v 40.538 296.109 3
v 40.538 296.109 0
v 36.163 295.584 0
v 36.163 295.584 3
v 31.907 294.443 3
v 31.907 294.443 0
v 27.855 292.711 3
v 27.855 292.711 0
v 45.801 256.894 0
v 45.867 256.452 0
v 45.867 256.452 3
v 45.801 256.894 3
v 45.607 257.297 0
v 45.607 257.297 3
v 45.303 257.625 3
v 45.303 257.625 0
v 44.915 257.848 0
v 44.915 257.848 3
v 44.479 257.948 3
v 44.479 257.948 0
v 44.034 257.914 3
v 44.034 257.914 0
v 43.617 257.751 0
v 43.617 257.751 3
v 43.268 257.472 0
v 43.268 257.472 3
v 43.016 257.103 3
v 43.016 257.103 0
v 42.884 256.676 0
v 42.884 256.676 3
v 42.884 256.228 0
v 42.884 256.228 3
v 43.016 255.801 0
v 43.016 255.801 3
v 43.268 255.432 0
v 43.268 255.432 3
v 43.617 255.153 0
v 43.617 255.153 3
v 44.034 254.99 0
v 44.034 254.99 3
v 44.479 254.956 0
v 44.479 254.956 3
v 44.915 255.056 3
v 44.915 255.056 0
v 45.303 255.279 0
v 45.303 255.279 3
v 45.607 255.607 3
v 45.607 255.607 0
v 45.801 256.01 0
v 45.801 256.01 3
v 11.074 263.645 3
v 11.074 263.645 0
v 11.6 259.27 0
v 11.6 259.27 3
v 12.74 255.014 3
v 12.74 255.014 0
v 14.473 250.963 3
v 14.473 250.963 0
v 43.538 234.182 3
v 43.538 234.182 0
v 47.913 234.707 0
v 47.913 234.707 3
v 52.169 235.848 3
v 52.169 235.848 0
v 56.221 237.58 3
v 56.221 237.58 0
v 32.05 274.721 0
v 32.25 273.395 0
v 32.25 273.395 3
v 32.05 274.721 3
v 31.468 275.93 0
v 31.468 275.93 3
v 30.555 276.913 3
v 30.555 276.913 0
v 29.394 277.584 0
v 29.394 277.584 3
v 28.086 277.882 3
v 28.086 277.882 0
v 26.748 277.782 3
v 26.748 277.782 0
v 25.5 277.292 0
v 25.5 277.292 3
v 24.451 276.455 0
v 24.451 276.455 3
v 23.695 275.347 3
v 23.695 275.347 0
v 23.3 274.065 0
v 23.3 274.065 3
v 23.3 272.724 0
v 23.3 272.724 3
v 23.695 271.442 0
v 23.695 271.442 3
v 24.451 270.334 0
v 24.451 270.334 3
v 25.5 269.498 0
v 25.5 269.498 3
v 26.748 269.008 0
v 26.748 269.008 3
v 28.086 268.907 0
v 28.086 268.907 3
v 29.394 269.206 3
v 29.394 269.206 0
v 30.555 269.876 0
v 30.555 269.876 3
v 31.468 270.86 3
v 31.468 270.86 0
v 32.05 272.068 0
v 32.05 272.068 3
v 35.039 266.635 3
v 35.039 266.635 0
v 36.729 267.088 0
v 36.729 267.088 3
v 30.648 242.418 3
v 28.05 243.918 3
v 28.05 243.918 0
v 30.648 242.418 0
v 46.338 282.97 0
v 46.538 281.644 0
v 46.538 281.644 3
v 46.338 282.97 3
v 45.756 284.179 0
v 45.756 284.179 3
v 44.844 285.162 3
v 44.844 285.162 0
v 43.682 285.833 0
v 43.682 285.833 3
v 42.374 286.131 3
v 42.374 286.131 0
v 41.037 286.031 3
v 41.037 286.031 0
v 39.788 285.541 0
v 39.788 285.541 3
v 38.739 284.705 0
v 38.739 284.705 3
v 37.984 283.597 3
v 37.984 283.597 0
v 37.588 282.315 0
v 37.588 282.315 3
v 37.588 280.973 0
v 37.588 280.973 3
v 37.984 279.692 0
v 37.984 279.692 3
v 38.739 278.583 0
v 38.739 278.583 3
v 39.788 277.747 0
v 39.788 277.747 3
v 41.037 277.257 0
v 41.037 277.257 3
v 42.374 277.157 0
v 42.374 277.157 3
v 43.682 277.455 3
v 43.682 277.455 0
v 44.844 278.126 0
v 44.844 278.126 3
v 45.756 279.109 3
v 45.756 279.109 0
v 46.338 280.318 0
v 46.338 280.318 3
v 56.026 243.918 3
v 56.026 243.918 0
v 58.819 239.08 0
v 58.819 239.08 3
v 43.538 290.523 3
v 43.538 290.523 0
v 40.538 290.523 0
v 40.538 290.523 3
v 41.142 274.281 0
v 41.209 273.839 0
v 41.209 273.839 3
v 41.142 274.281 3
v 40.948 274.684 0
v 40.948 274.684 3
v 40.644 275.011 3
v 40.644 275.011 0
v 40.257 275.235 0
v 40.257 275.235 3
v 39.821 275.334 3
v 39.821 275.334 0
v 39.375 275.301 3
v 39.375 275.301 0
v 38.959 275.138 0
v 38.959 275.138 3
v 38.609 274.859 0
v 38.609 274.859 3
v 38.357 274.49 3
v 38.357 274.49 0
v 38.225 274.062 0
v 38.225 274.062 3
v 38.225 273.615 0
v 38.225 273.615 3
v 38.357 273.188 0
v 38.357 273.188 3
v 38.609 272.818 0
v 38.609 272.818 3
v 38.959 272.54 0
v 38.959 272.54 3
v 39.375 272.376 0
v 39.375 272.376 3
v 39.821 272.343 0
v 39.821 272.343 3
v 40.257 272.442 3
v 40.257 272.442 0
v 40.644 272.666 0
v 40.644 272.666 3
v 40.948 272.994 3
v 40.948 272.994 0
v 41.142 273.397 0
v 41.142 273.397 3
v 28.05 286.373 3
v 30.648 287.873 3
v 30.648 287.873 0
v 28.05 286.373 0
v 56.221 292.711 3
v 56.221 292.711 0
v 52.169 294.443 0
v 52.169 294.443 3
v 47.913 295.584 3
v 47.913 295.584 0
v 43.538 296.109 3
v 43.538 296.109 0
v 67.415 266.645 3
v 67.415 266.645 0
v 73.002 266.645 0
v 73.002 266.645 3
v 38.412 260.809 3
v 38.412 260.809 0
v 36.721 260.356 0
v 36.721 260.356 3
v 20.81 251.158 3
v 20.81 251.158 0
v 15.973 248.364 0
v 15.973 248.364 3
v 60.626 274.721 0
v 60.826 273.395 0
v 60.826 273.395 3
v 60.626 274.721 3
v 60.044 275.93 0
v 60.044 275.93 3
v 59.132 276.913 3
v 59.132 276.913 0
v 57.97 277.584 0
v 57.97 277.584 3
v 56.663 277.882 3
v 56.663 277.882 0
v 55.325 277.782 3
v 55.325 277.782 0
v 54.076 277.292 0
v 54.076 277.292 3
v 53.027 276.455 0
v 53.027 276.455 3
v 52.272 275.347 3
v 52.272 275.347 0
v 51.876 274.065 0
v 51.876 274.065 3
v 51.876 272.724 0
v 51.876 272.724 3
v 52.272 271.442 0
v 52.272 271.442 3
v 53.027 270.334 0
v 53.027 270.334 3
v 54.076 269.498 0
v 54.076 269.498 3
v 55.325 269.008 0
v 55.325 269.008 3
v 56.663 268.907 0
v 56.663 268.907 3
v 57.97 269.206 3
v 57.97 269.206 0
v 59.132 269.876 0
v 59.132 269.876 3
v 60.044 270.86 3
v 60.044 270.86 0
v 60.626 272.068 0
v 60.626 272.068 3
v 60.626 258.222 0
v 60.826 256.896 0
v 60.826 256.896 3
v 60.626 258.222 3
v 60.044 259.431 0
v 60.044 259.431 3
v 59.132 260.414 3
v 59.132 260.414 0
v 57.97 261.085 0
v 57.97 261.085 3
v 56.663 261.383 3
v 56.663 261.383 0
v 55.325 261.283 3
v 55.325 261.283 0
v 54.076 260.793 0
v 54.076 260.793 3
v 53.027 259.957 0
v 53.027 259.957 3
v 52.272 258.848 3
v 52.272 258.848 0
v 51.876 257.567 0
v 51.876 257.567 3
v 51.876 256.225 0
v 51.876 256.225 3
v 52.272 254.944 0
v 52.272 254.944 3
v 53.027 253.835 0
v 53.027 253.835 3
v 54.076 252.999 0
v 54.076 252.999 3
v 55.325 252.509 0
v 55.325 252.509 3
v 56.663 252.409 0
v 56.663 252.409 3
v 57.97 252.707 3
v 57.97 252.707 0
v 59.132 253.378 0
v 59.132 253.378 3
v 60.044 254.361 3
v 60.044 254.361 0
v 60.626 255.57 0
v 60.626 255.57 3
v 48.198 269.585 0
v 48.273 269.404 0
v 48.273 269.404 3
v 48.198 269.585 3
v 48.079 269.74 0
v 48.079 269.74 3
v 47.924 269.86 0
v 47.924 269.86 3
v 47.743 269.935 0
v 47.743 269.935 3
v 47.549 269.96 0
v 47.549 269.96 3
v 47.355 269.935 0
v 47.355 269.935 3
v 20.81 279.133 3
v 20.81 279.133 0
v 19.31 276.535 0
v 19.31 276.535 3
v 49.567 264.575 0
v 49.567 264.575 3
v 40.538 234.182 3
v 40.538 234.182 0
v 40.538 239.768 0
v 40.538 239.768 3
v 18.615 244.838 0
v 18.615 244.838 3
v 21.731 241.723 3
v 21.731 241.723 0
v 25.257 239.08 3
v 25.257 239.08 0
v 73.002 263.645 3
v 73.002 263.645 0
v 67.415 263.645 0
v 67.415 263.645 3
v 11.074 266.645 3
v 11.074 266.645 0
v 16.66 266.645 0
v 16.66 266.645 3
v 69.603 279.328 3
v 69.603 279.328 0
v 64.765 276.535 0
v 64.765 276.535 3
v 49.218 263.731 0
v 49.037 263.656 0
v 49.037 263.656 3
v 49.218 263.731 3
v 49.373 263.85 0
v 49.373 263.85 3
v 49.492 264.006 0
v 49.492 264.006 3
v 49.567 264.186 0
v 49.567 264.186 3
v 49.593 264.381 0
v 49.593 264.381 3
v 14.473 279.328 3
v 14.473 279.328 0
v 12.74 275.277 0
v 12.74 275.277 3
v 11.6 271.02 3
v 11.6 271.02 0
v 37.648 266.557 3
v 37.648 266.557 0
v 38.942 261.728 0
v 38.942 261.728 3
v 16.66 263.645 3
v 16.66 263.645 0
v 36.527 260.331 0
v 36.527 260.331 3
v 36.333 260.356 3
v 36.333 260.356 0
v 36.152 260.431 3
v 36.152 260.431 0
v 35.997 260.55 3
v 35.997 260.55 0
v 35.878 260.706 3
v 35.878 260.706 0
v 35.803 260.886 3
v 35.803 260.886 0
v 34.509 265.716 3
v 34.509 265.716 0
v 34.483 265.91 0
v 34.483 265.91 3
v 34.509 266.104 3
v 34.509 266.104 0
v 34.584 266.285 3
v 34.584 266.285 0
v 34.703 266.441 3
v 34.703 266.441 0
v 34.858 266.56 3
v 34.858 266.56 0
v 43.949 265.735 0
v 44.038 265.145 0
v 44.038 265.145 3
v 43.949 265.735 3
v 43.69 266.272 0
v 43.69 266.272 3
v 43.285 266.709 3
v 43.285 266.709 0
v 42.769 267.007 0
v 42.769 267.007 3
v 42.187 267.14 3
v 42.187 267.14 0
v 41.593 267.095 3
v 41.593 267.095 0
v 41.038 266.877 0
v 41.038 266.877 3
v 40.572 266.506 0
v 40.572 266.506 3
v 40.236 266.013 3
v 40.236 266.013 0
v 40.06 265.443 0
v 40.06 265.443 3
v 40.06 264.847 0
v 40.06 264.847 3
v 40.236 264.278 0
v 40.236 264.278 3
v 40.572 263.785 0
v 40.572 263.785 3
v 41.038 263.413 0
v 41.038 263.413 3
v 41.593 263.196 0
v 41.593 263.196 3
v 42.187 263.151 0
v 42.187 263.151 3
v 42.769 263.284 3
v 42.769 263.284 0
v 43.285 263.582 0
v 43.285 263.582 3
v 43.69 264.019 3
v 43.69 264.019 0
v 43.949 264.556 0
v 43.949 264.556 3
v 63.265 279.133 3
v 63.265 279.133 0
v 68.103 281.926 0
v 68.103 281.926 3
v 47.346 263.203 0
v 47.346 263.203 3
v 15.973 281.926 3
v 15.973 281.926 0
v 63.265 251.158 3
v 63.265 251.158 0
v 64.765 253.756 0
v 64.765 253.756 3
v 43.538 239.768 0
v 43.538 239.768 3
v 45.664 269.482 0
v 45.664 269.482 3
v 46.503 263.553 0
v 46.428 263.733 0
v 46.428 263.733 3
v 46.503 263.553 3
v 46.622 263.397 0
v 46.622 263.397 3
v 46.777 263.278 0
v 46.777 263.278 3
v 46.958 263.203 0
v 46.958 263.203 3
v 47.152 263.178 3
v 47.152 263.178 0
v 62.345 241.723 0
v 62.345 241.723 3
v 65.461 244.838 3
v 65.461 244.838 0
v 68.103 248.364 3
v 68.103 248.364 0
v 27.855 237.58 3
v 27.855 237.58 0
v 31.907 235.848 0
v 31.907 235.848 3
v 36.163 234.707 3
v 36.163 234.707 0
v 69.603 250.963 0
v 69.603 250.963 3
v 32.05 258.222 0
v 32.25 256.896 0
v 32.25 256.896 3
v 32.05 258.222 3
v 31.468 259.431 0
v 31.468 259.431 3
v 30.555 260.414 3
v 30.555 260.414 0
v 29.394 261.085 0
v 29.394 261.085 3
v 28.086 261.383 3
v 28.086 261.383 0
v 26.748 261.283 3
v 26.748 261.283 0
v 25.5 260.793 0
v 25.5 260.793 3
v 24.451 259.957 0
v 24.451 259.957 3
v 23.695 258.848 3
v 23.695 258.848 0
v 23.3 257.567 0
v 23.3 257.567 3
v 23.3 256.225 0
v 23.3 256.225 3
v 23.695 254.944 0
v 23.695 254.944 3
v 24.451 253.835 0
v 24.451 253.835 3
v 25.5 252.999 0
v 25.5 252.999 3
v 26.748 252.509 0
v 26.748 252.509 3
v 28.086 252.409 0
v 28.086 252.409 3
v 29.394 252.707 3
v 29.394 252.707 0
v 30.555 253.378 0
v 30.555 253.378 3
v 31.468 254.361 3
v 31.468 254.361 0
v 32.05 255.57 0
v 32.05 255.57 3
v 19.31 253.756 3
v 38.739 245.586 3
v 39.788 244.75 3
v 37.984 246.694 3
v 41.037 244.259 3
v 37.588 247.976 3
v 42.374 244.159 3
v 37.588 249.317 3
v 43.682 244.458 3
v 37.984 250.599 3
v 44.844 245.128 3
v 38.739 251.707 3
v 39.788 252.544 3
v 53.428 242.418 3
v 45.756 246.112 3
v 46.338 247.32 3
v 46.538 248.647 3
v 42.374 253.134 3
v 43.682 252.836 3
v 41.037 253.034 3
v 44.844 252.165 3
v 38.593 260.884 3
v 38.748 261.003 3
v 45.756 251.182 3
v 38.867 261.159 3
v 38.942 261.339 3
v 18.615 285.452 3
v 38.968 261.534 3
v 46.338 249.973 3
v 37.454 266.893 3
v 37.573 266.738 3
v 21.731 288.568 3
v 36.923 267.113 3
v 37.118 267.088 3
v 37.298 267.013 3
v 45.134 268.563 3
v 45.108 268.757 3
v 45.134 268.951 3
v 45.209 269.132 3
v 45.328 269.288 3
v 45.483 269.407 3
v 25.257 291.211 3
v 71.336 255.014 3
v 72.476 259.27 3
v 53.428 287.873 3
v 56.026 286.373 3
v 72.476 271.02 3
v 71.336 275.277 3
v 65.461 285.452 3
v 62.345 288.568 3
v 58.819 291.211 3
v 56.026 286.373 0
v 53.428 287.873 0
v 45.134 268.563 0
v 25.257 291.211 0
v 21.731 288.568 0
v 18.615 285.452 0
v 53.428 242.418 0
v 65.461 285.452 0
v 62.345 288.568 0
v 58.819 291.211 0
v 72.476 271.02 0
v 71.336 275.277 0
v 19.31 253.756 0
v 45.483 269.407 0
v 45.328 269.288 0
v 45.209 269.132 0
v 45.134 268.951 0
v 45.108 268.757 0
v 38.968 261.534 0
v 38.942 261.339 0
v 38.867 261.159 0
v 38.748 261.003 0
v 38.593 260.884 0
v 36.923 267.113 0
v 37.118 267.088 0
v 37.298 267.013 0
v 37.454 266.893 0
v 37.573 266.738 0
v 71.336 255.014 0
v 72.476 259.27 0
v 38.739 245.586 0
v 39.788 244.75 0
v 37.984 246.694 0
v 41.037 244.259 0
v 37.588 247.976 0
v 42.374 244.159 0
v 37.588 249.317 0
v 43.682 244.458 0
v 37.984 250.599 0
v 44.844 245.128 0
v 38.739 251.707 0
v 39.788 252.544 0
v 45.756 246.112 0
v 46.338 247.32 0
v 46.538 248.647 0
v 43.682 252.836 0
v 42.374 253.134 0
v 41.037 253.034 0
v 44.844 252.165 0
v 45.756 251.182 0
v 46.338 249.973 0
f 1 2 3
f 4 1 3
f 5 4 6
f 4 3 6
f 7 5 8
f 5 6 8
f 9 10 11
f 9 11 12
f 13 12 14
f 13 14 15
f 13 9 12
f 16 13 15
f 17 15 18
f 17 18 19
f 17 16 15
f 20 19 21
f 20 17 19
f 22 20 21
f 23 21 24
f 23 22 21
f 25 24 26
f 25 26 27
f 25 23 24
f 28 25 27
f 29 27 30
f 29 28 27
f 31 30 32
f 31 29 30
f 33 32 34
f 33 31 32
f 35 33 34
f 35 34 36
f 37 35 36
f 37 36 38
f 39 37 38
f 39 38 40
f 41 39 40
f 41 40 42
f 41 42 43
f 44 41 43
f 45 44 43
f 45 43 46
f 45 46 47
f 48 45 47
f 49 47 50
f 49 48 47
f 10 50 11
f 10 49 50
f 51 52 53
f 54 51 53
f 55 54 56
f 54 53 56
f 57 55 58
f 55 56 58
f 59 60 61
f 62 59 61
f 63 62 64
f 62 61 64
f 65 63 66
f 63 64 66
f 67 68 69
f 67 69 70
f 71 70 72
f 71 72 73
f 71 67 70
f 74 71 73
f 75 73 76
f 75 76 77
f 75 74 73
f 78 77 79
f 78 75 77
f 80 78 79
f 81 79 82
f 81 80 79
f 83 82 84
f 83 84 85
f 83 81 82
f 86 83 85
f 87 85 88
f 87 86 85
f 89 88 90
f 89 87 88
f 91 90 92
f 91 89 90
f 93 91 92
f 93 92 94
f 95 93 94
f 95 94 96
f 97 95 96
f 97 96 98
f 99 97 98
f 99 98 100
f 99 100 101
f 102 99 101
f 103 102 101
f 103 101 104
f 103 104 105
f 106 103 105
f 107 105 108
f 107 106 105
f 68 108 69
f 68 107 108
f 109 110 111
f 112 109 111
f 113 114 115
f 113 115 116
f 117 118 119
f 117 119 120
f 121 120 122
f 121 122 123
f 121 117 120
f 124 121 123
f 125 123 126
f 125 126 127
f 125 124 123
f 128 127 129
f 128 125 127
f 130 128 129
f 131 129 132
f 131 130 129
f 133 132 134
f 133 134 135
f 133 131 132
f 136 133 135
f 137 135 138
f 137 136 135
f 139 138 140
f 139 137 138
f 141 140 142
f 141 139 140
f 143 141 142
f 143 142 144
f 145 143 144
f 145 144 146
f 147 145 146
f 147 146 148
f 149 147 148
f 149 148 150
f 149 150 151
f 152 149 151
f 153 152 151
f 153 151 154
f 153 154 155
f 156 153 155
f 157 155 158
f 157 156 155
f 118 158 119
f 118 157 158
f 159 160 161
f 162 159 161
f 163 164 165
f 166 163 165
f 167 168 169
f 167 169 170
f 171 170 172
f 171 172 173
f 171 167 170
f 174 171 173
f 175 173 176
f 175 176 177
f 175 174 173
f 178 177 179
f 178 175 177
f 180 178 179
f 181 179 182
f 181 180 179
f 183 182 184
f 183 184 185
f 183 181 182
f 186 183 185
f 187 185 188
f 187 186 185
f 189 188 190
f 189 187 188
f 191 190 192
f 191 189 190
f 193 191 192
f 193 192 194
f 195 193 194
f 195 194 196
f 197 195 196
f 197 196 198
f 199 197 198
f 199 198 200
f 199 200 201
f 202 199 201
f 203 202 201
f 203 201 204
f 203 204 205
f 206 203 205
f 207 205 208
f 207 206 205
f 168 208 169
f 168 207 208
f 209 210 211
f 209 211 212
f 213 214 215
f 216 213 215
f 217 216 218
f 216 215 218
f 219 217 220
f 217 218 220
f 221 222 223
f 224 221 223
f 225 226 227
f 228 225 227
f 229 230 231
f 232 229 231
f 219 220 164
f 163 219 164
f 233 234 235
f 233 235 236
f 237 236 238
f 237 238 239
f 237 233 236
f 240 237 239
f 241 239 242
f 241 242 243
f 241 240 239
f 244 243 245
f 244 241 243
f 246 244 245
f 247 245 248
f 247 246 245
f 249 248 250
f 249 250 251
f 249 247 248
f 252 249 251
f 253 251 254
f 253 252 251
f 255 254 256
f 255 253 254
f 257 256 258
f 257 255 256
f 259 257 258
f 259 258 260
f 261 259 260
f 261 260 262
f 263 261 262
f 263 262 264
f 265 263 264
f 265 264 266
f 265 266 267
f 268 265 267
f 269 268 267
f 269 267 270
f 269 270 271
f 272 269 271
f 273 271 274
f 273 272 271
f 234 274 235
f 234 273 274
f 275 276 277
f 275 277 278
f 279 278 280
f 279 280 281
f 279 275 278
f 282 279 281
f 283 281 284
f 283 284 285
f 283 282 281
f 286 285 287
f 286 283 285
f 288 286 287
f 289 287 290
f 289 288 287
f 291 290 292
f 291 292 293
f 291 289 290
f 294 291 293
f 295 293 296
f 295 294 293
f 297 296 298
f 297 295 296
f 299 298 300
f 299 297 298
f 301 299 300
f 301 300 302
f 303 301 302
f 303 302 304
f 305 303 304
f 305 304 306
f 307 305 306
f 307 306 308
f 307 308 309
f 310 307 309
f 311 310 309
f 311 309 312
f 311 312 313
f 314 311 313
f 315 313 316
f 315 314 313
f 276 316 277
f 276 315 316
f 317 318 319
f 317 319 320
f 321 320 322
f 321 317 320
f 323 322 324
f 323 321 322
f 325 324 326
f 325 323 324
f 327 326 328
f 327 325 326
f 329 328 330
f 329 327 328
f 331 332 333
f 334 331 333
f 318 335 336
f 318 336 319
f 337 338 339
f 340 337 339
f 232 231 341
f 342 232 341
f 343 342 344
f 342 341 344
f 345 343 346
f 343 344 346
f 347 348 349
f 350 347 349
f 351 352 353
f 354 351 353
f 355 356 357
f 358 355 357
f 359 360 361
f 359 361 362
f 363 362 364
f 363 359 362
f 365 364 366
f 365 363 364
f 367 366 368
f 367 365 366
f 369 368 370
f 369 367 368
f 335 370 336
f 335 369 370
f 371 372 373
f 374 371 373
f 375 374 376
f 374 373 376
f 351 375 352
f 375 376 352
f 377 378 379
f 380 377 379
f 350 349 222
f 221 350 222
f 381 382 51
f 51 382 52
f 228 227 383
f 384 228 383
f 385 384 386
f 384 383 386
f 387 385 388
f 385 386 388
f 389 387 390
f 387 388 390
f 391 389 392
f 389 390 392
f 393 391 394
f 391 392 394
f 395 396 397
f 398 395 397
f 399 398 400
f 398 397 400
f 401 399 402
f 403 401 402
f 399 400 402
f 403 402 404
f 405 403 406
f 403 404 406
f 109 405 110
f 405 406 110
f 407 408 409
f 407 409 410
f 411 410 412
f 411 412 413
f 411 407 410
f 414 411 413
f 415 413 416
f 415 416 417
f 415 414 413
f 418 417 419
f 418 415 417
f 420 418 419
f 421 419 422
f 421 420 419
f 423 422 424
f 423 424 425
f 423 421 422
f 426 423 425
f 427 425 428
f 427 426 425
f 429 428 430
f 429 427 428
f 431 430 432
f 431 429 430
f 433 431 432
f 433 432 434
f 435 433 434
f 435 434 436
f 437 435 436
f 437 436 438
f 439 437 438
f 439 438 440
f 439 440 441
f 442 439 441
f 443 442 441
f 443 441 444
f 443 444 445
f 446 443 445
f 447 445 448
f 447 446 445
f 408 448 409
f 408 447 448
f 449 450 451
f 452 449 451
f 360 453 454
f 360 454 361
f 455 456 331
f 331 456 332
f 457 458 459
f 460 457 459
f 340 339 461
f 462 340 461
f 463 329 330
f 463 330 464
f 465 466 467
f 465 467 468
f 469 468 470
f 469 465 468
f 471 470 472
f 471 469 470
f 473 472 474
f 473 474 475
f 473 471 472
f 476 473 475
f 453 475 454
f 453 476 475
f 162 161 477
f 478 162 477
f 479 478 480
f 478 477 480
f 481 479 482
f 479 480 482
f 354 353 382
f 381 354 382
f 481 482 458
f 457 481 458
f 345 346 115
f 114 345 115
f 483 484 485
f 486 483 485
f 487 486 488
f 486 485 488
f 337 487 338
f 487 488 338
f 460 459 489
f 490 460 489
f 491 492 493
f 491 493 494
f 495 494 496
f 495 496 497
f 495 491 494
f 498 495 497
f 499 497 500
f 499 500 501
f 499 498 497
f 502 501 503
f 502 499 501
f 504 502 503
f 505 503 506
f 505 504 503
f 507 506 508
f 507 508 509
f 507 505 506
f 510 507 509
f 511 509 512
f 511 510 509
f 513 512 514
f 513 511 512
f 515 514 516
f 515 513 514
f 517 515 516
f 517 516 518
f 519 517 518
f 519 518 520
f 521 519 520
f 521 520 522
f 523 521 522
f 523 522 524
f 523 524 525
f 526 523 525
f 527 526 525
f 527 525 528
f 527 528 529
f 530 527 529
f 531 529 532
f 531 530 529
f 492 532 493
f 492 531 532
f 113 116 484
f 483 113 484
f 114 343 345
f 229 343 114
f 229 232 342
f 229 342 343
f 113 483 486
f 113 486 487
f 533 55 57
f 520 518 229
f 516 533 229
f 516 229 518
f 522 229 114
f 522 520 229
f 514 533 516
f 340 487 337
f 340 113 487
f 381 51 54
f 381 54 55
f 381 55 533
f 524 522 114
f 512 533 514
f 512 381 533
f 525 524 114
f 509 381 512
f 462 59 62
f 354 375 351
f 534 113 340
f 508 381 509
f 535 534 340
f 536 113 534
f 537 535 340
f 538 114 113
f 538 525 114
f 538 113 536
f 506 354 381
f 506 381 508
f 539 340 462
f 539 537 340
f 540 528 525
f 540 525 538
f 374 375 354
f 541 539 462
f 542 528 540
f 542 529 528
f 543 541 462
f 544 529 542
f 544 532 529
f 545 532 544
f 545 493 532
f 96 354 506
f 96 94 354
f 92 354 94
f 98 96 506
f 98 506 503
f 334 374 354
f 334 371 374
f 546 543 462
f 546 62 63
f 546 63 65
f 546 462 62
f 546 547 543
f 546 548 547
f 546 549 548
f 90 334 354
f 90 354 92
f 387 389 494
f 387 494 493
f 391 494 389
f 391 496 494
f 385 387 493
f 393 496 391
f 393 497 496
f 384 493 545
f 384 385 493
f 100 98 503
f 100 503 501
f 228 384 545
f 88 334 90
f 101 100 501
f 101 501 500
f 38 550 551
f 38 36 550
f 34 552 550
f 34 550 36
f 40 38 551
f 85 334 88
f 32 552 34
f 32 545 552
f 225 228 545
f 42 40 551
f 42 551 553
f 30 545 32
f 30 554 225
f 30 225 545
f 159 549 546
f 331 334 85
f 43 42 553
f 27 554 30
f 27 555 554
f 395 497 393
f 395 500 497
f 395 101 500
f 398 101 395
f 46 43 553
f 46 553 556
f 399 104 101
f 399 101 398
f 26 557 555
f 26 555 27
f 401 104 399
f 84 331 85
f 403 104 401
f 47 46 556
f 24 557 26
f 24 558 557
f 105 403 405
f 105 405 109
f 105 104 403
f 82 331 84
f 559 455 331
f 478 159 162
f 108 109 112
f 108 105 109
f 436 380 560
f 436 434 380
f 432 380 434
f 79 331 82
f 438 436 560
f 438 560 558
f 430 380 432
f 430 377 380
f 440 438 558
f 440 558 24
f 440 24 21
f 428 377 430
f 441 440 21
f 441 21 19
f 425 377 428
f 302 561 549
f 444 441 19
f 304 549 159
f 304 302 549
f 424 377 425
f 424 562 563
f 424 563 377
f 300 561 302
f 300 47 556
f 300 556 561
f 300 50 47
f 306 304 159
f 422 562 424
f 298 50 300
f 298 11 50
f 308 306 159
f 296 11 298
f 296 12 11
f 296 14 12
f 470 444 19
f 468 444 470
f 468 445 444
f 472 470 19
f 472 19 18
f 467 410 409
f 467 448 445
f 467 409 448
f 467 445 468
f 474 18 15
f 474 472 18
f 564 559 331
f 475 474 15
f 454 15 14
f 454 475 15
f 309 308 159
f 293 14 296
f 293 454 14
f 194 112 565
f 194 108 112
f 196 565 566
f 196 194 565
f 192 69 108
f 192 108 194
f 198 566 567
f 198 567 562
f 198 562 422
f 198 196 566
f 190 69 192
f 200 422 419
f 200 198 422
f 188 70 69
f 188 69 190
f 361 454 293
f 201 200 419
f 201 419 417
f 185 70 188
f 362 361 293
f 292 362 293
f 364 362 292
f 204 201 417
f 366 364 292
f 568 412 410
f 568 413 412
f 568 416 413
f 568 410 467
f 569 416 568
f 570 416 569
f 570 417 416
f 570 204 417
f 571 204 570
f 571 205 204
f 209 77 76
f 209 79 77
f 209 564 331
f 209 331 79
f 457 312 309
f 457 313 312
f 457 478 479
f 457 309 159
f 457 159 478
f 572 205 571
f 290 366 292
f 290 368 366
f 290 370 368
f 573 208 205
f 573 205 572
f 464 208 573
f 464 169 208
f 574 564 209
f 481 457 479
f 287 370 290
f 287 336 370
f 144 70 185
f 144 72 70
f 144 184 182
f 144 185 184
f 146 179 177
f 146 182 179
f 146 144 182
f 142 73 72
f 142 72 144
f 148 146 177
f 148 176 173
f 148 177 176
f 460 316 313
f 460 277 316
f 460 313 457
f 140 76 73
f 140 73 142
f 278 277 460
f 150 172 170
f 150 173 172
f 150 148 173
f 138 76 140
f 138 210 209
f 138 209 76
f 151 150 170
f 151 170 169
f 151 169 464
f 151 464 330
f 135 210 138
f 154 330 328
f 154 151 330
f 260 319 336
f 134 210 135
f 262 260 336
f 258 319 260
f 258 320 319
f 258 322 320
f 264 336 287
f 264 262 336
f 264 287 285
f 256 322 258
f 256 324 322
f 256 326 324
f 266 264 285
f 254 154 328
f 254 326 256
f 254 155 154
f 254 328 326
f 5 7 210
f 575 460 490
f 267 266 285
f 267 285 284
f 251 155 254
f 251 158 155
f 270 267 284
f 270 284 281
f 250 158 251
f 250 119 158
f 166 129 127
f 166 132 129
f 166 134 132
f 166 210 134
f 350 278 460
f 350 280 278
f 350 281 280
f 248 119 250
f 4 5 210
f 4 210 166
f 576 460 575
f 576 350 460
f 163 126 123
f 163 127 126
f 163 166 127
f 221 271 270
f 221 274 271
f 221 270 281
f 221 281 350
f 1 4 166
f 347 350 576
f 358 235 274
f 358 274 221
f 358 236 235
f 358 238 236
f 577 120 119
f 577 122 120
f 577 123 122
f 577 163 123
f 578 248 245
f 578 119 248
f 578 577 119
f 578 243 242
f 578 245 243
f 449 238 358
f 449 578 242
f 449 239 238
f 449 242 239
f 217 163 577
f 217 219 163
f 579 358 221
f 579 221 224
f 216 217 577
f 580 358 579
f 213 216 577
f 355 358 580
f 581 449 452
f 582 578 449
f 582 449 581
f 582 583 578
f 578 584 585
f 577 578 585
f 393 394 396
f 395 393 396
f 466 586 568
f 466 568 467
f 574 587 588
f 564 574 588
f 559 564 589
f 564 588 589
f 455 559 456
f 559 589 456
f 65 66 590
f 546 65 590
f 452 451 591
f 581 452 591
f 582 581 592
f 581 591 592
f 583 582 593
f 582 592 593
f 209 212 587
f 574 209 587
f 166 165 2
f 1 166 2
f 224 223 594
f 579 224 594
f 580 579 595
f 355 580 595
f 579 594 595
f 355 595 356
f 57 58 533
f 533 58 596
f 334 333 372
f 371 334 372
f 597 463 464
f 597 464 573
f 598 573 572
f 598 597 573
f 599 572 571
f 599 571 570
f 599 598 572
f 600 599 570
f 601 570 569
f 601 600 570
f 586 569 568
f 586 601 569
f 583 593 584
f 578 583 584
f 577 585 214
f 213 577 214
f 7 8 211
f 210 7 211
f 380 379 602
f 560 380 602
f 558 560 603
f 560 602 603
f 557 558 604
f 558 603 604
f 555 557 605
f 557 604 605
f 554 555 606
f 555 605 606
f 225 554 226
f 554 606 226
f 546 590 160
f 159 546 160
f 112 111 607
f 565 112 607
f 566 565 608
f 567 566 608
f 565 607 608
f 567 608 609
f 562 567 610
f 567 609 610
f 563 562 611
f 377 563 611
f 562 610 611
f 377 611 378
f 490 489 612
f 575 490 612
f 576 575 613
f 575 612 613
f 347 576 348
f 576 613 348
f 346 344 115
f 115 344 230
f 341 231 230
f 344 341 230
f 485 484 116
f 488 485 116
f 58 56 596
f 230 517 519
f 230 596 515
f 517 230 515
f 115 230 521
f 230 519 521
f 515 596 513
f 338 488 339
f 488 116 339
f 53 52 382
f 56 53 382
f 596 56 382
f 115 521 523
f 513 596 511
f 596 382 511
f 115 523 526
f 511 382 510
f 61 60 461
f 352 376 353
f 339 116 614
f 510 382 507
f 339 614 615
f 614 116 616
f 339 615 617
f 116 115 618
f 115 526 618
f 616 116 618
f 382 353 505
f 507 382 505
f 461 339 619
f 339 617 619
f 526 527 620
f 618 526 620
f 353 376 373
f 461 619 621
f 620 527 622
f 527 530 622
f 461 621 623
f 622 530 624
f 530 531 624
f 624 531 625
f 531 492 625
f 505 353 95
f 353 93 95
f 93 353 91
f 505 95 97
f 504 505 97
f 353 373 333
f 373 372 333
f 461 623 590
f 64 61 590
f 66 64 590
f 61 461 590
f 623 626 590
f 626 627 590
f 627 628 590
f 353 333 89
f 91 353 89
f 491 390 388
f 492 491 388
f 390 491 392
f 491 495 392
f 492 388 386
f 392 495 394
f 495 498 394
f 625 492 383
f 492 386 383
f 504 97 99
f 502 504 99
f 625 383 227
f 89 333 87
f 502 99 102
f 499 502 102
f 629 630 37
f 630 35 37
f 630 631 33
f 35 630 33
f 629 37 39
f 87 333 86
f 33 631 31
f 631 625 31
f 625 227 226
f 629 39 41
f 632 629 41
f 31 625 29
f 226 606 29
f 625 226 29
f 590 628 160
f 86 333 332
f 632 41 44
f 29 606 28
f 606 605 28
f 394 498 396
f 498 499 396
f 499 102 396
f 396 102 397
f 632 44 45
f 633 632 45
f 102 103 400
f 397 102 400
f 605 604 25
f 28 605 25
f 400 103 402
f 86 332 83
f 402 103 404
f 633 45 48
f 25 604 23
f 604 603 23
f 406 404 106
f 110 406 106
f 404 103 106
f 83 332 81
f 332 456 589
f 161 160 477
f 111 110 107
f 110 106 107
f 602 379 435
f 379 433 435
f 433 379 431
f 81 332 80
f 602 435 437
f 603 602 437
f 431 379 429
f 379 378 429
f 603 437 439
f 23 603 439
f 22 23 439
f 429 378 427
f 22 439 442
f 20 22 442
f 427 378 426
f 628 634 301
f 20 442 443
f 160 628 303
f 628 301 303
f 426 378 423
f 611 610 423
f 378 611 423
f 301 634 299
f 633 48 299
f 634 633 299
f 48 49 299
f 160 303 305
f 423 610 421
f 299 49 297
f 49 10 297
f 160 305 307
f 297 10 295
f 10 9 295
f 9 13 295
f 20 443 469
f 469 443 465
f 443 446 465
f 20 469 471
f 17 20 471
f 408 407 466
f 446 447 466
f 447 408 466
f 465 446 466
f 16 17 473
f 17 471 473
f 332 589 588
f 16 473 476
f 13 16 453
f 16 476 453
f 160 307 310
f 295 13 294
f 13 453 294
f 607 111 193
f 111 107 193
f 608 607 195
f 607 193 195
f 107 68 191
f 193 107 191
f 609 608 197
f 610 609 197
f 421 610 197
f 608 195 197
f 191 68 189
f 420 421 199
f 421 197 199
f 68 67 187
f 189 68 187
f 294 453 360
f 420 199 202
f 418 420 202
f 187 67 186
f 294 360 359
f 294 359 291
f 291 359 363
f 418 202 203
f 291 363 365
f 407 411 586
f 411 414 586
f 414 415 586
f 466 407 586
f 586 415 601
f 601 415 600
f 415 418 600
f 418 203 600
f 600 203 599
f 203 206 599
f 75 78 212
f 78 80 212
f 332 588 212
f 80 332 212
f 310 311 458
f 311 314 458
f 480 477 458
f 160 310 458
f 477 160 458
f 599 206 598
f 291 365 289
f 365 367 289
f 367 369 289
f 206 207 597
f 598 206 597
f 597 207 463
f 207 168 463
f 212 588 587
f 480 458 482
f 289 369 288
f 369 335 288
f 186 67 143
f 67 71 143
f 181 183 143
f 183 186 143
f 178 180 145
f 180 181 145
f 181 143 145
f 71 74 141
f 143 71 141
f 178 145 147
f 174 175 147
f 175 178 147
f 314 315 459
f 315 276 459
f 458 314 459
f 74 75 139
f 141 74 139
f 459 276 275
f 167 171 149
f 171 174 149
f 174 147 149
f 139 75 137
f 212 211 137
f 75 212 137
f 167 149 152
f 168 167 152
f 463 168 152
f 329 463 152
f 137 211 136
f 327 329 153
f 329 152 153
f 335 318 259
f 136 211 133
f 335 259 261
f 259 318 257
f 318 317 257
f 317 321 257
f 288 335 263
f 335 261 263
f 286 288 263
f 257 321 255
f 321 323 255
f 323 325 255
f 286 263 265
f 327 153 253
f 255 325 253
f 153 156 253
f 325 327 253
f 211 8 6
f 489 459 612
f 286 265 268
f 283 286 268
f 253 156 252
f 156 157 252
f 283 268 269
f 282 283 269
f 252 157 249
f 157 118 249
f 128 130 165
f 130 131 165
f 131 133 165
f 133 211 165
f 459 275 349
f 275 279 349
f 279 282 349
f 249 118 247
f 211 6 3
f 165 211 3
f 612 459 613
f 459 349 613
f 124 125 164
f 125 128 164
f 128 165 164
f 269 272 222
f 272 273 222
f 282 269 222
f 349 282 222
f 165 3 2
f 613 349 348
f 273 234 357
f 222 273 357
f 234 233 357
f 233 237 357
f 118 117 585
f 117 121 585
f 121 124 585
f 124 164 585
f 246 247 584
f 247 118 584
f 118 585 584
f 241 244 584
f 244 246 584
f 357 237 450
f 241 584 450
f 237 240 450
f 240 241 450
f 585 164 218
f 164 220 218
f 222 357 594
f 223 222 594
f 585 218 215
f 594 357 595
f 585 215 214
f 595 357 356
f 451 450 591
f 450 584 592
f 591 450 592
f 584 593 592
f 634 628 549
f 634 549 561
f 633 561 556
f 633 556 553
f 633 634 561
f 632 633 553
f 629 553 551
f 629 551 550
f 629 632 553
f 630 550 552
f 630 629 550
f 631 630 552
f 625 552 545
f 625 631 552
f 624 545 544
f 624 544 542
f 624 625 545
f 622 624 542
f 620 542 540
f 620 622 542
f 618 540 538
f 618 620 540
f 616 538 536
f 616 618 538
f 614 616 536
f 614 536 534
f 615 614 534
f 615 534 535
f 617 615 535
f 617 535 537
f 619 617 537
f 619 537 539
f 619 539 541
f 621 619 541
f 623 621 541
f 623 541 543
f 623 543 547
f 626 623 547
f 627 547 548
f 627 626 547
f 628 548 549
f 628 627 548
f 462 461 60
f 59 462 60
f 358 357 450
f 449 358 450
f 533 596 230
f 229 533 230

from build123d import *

# Parameters (mm, degrees)
MODEL_R                 = 2
MODEL_R_2               = 1.5
MODEL_R_3               = 4.5
SALIENTE_EXTRUIR1_DEPTH = 3


with BuildPart() as part:
    # Model → Saliente-Extruir1 (new body)
    with BuildSketch(Plane.XY):
        with BuildLine():
            Line((53.427599038, 287.872856798), (56.220729127, 292.710700024))
            ThreePointArc((56.220729127, 292.710700024), (50.061313425, 295.08905988), (43.537923027, 296.109047676))
            Line((43.537923027, 296.109047676), (43.537923027, 290.522787498))
            Line((43.537923027, 290.522787498), (40.537923027, 290.522787498))
            Line((40.537923027, 290.522787498), (40.537923027, 296.109047676))
            ThreePointArc((40.537923027, 296.109047676), (34.014532629, 295.08905988), (27.855116927, 292.710700024))
            Line((27.855116927, 292.710700024), (30.648247016, 287.872856798))
            Line((30.648247016, 287.872856798), (28.050170805, 286.372856798))
            Line((28.050170805, 286.372856798), (25.257040716, 291.210700024))
            ThreePointArc((25.257040716, 291.210700024), (20.11761281, 287.065669482), (15.972582269, 281.926241576))
            Line((15.972582269, 281.926241576), (20.810425495, 279.133111488))
            Line((20.810425495, 279.133111488), (19.310425495, 276.535035276))
            Line((19.310425495, 276.535035276), (14.472582269, 279.328165365))
            ThreePointArc((14.472582269, 279.328165365), (12.094222412, 273.168749664), (11.074234616, 266.645359265))
            Line((11.074234616, 266.645359265), (16.660494794, 266.645359265))
            Line((16.660494794, 266.645359265), (16.660494794, 263.645359265))
            Line((16.660494794, 263.645359265), (11.074234616, 263.645359265))
            ThreePointArc((11.074234616, 263.645359265), (12.094222412, 257.121968867), (14.472582269, 250.962553166))
            Line((14.472582269, 250.962553166), (19.310425495, 253.755683255))
            Line((19.310425495, 253.755683255), (20.810425495, 251.157607043))
            Line((20.810425495, 251.157607043), (15.972582269, 248.364476954))
            ThreePointArc((15.972582269, 248.364476954), (20.11761281, 243.225049049), (25.257040716, 239.080018507))
            Line((25.257040716, 239.080018507), (28.050170805, 243.917861733))
            Line((28.050170805, 243.917861733), (30.648247016, 242.417861733))
            Line((30.648247016, 242.417861733), (27.855116927, 237.580018507))
            ThreePointArc((27.855116927, 237.580018507), (34.014532629, 235.20165865), (40.537923027, 234.181670855))
            Line((40.537923027, 234.181670855), (40.537923027, 239.767931032))
            Line((40.537923027, 239.767931032), (43.537923027, 239.767931032))
            Line((43.537923027, 239.767931032), (43.537923027, 234.181670855))
            ThreePointArc((43.537923027, 234.181670855), (50.061313425, 235.20165865), (56.220729127, 237.580018507))
            Line((56.220729127, 237.580018507), (53.427599038, 242.417861733))
            Line((53.427599038, 242.417861733), (56.025675249, 243.917861733))
            Line((56.025675249, 243.917861733), (58.818805338, 239.080018507))
            ThreePointArc((58.818805338, 239.080018507), (63.958233244, 243.225049049), (68.103263786, 248.364476954))
            Line((68.103263786, 248.364476954), (63.26542056, 251.157607043))
            Line((63.26542056, 251.157607043), (64.76542056, 253.755683255))
            Line((64.76542056, 253.755683255), (69.603263786, 250.962553166))
            ThreePointArc((69.603263786, 250.962553166), (71.981623642, 257.121968867), (73.001611438, 263.645359265))
            Line((73.001611438, 263.645359265), (67.41535126, 263.645359265))
            Line((67.41535126, 263.645359265), (67.41535126, 266.645359265))
            Line((67.41535126, 266.645359265), (73.001611438, 266.645359265))
            ThreePointArc((73.001611438, 266.645359265), (71.981623642, 273.168749664), (69.603263786, 279.328165365))
            Line((69.603263786, 279.328165365), (64.76542056, 276.535035276))
            Line((64.76542056, 276.535035276), (63.26542056, 279.133111488))
            Line((63.26542056, 279.133111488), (68.103263786, 281.926241576))
            ThreePointArc((68.103263786, 281.926241576), (63.958233244, 287.065669482), (58.818805338, 291.210700024))
            Line((58.818805338, 291.210700024), (56.025675249, 286.372856798))
            Line((56.025675249, 286.372856798), (53.427599038, 287.872856798))
        make_face()
        with Locations((42.037923027, 265.145359265)):
            Circle(MODEL_R, mode=Mode.SUBTRACT)
        with Locations((39.708551621, 273.838691702)):
            Circle(MODEL_R_2, mode=Mode.SUBTRACT)
        with Locations((44.367294433, 256.452026829)):
            Circle(MODEL_R_2, mode=Mode.SUBTRACT)
        with Locations((42.037923027, 281.644073382)):
            Circle(MODEL_R_3, mode=Mode.SUBTRACT)
        with Locations((27.749617473, 273.394716324)):
            Circle(MODEL_R_3, mode=Mode.SUBTRACT)
        with Locations((27.749617473, 256.896002207)):
            Circle(MODEL_R_3, mode=Mode.SUBTRACT)
        with Locations((42.037923027, 248.646645149)):
            Circle(MODEL_R_3, mode=Mode.SUBTRACT)
        with Locations((56.326228582, 256.896002207)):
            Circle(MODEL_R_3, mode=Mode.SUBTRACT)
        with Locations((56.326228582, 273.394716324)):
            Circle(MODEL_R_3, mode=Mode.SUBTRACT)
        with BuildLine():
            Line((47.354538273, 269.934589613), (45.664168077, 269.481656284))
            ThreePointArc((45.664168077, 269.481656284), (45.208763308, 269.132211915), (45.133837991, 268.563097631))
            Line((45.133837991, 268.563097631), (46.427933217, 263.733468499))
            ThreePointArc((46.427933217, 263.733468499), (46.777377587, 263.27806373), (47.34649187, 263.203138414))
            Line((47.34649187, 263.203138414), (49.036862066, 263.656071742))
            ThreePointArc((49.036862066, 263.656071742), (49.492266835, 264.005516112), (49.567192152, 264.574630396))
            Line((49.567192152, 264.574630396), (48.273096927, 269.404259527))
            ThreePointArc((48.273096927, 269.404259527), (47.923652557, 269.859664296), (47.354538273, 269.934589613))
        make_face(mode=Mode.SUBTRACT)
        with BuildLine():
            Line((35.038983988, 266.634646788), (36.729354184, 267.087580117))
            ThreePointArc((36.729354184, 267.087580117), (37.298468468, 267.0126548), (37.647912838, 266.557250031))
            Line((37.647912838, 266.557250031), (38.942008063, 261.7276209))
            ThreePointArc((38.942008063, 261.7276209), (38.867082746, 261.158506616), (38.411677977, 260.809062246))
            Line((38.411677977, 260.809062246), (36.721307781, 260.356128917))
            ThreePointArc((36.721307781, 260.356128917), (36.152193497, 260.431054234), (35.802749128, 260.886459003))
            Line((35.802749128, 260.886459003), (34.508653902, 265.716088135))
            ThreePointArc((34.508653902, 265.716088135), (34.583579219, 266.285202419), (35.038983988, 266.634646788))
        make_face(mode=Mode.SUBTRACT)
    extrude(amount=SALIENTE_EXTRUIR1_DEPTH)


solid = part.part
